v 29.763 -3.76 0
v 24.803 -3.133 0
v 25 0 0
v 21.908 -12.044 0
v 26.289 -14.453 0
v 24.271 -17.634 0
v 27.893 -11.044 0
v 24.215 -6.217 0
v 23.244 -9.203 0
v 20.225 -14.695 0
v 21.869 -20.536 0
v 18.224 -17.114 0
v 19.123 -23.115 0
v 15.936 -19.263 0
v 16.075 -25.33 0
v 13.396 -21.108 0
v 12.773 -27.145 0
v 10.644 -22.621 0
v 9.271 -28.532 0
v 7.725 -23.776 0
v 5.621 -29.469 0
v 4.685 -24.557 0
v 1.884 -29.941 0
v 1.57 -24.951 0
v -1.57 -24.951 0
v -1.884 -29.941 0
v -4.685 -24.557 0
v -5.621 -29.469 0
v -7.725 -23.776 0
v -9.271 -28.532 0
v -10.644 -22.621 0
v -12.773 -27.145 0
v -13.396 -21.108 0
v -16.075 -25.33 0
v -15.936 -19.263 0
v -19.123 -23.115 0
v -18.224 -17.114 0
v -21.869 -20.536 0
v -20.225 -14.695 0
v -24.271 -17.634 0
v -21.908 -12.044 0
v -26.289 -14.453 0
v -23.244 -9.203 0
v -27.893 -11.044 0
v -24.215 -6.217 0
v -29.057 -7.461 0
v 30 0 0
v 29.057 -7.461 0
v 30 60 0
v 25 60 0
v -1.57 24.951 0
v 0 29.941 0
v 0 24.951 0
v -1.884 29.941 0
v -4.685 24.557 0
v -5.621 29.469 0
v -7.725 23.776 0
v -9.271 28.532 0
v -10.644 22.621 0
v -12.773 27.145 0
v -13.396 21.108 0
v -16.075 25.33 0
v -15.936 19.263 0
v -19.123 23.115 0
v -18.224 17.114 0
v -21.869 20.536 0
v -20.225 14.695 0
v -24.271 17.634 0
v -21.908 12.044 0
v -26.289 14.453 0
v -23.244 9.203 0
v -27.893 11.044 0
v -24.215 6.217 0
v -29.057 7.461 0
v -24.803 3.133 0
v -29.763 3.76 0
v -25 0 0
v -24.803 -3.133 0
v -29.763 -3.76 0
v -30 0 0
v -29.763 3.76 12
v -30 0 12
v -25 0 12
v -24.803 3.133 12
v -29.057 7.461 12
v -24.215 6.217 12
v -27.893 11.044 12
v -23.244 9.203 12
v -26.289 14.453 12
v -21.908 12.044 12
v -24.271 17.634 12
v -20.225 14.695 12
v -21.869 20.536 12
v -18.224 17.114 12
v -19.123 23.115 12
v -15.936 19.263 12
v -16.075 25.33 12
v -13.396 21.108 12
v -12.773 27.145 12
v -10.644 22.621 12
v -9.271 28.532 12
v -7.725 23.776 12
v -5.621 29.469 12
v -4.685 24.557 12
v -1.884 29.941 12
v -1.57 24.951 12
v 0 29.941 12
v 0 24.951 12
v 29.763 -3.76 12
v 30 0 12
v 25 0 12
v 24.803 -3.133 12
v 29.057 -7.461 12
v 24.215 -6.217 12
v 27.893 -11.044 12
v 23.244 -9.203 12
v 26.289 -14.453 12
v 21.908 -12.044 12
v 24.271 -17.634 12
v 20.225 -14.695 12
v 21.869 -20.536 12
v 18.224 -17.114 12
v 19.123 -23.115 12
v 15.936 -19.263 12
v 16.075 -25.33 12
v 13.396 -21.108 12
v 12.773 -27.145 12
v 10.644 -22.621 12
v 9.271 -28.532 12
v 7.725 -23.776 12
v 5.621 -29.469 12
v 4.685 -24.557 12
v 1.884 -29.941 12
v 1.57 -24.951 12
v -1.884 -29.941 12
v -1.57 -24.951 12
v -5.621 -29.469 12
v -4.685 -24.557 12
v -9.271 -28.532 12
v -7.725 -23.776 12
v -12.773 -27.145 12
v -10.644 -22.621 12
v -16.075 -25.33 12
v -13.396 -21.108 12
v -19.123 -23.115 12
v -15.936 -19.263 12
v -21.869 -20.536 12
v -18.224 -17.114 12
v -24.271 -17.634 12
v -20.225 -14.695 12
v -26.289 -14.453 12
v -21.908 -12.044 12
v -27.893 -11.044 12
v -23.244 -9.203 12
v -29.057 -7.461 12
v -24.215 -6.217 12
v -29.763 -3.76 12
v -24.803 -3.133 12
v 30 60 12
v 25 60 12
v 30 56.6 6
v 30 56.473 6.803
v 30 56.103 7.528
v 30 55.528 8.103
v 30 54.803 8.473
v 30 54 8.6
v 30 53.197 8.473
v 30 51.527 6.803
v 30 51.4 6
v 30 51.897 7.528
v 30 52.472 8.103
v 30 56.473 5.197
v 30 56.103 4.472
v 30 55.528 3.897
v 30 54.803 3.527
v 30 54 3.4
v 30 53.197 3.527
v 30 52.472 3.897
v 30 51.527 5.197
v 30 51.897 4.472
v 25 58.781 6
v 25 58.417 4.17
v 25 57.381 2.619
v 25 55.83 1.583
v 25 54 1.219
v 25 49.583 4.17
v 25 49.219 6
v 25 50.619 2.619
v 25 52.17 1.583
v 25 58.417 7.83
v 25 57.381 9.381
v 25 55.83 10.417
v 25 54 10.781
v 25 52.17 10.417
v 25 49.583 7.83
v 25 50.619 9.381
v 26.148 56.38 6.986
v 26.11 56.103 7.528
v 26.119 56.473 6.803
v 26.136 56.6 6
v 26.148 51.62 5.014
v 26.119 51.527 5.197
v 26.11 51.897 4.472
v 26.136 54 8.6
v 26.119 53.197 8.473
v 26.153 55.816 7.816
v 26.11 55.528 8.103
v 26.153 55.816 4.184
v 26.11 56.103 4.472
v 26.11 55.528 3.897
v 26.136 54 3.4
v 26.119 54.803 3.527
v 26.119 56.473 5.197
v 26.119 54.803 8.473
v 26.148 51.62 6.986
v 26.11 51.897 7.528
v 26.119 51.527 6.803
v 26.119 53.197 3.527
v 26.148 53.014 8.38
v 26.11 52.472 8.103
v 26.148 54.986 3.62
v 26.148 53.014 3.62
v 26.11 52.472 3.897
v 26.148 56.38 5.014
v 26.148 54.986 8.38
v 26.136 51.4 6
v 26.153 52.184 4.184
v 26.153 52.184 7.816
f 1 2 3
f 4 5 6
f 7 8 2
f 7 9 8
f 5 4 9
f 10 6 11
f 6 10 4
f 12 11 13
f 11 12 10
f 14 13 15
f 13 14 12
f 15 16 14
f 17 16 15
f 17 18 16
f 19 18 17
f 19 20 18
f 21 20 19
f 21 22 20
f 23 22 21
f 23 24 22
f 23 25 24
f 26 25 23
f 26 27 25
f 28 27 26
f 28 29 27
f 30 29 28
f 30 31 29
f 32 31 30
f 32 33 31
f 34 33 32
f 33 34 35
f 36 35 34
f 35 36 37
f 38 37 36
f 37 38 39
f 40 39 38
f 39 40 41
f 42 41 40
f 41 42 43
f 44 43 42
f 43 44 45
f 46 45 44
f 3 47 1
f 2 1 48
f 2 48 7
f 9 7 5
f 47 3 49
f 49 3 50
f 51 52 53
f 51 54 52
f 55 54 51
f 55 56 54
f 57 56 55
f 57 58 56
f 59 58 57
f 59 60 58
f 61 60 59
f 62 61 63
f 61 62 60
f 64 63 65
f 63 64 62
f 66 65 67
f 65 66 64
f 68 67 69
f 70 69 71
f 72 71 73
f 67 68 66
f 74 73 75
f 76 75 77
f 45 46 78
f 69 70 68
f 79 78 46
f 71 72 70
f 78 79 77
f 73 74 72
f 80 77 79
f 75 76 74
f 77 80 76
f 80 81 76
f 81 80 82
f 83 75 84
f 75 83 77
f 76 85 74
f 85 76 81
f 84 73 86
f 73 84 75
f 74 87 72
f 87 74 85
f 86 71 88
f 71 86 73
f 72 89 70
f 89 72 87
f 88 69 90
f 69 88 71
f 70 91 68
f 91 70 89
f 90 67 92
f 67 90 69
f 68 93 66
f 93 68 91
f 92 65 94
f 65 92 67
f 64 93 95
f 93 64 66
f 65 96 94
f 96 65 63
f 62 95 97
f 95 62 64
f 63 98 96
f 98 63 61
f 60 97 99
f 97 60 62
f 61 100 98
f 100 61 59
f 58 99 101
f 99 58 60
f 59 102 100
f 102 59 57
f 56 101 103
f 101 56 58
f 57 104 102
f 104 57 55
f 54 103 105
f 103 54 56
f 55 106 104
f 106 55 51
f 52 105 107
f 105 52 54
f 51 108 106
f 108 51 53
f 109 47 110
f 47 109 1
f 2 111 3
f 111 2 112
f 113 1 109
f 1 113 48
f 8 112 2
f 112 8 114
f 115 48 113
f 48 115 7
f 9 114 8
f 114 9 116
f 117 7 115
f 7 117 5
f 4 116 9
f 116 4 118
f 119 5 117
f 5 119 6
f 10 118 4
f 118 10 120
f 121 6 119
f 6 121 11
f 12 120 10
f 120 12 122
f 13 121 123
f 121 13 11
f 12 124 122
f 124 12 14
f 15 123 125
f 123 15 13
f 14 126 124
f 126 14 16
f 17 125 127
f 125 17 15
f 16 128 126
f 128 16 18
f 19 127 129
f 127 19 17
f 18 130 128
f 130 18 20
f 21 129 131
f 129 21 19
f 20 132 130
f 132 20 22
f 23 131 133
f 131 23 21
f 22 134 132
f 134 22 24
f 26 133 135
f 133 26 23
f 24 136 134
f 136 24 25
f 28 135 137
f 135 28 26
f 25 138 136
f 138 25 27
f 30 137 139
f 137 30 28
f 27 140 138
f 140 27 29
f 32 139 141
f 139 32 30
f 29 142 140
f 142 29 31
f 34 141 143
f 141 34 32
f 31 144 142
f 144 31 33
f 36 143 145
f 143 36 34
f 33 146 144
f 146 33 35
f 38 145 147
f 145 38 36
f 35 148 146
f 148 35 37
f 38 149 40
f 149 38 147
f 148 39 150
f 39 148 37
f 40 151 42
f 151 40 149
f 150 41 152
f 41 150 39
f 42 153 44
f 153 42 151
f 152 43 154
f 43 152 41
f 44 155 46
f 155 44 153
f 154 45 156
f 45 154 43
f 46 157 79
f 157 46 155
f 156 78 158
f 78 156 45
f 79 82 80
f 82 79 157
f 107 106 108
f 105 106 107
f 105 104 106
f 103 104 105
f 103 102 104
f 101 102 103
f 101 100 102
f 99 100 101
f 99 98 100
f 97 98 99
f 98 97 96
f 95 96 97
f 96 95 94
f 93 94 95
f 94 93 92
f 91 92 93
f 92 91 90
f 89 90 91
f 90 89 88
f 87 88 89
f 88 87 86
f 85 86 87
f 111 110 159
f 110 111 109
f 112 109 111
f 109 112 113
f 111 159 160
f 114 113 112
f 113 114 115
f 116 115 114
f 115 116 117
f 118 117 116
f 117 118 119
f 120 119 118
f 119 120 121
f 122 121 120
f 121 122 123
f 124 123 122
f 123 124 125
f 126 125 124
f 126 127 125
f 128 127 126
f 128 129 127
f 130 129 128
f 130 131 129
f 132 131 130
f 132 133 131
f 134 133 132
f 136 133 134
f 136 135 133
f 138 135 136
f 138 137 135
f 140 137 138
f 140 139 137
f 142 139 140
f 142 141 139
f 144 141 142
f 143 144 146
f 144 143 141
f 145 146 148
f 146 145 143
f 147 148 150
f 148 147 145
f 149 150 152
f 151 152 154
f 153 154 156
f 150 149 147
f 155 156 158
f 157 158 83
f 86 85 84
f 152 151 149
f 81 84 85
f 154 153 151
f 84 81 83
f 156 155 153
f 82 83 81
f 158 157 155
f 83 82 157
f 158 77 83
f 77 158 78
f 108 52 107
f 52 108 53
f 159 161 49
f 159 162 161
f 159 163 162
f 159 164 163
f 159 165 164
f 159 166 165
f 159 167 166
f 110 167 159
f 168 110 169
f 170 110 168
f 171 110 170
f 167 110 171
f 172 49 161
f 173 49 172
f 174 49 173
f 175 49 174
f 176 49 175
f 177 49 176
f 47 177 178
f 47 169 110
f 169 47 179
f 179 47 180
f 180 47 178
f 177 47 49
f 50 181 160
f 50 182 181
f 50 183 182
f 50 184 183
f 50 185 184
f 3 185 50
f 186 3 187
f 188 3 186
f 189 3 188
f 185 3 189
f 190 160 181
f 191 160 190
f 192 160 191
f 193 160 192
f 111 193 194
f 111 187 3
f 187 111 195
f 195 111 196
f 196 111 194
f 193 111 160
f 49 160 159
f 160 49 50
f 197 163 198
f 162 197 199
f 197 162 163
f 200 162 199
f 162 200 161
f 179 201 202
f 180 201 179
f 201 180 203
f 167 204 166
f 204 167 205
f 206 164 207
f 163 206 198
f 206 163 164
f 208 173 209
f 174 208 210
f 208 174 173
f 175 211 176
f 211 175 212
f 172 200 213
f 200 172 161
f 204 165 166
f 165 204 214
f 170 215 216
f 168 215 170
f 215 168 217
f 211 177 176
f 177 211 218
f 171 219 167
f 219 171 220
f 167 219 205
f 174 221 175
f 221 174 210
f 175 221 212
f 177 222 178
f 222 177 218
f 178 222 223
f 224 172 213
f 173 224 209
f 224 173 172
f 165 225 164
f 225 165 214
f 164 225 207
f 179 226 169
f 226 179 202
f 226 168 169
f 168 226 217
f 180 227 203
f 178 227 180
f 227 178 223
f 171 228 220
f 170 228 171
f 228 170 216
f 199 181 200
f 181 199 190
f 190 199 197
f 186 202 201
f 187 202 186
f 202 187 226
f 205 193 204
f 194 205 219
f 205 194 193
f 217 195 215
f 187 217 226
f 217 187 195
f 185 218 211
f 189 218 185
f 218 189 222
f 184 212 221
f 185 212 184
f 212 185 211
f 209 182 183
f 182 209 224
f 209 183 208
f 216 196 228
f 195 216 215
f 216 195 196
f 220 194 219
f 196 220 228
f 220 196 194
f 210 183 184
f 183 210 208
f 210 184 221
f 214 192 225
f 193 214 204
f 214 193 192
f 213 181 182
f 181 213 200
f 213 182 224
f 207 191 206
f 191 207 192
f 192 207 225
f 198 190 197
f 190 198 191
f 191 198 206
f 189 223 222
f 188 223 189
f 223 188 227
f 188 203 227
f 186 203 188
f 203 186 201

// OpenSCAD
// Radius of hook [mm]
hookRadius=25; 
// Width of hook [mm]
width=12; 
//Thickness of hook [mm]
thickness=5; 
// Radius of mounting hole [mm]
holeRadius=2.6; 
// height of mounting section [mm]
height=60;  

union() {

	difference() {
		rotate_extrude(convexity = 10,$fn=50)
		translate([hookRadius, 0, 0])
		square([thickness,width]);
	
		translate([0,0,-1])
		cube([hookRadius*2,hookRadius*2,width+2]);
	}
	
	
	difference() {
		translate([hookRadius,0,0])
		cube([thickness,height,width]);
	
		translate([hookRadius-1,height-max(holeRadius*2, width/2),width/2])
		rotate([90,0,90])
		cylinder(r=holeRadius,h=thickness+2,$fn=20);
		translate([hookRadius-0.01,height-max(holeRadius*2, width/2),width/2])
		rotate([90,0,90])
		cylinder(r1=4.8,r2=0,h=min(thickness/2, 5));
	}
}
